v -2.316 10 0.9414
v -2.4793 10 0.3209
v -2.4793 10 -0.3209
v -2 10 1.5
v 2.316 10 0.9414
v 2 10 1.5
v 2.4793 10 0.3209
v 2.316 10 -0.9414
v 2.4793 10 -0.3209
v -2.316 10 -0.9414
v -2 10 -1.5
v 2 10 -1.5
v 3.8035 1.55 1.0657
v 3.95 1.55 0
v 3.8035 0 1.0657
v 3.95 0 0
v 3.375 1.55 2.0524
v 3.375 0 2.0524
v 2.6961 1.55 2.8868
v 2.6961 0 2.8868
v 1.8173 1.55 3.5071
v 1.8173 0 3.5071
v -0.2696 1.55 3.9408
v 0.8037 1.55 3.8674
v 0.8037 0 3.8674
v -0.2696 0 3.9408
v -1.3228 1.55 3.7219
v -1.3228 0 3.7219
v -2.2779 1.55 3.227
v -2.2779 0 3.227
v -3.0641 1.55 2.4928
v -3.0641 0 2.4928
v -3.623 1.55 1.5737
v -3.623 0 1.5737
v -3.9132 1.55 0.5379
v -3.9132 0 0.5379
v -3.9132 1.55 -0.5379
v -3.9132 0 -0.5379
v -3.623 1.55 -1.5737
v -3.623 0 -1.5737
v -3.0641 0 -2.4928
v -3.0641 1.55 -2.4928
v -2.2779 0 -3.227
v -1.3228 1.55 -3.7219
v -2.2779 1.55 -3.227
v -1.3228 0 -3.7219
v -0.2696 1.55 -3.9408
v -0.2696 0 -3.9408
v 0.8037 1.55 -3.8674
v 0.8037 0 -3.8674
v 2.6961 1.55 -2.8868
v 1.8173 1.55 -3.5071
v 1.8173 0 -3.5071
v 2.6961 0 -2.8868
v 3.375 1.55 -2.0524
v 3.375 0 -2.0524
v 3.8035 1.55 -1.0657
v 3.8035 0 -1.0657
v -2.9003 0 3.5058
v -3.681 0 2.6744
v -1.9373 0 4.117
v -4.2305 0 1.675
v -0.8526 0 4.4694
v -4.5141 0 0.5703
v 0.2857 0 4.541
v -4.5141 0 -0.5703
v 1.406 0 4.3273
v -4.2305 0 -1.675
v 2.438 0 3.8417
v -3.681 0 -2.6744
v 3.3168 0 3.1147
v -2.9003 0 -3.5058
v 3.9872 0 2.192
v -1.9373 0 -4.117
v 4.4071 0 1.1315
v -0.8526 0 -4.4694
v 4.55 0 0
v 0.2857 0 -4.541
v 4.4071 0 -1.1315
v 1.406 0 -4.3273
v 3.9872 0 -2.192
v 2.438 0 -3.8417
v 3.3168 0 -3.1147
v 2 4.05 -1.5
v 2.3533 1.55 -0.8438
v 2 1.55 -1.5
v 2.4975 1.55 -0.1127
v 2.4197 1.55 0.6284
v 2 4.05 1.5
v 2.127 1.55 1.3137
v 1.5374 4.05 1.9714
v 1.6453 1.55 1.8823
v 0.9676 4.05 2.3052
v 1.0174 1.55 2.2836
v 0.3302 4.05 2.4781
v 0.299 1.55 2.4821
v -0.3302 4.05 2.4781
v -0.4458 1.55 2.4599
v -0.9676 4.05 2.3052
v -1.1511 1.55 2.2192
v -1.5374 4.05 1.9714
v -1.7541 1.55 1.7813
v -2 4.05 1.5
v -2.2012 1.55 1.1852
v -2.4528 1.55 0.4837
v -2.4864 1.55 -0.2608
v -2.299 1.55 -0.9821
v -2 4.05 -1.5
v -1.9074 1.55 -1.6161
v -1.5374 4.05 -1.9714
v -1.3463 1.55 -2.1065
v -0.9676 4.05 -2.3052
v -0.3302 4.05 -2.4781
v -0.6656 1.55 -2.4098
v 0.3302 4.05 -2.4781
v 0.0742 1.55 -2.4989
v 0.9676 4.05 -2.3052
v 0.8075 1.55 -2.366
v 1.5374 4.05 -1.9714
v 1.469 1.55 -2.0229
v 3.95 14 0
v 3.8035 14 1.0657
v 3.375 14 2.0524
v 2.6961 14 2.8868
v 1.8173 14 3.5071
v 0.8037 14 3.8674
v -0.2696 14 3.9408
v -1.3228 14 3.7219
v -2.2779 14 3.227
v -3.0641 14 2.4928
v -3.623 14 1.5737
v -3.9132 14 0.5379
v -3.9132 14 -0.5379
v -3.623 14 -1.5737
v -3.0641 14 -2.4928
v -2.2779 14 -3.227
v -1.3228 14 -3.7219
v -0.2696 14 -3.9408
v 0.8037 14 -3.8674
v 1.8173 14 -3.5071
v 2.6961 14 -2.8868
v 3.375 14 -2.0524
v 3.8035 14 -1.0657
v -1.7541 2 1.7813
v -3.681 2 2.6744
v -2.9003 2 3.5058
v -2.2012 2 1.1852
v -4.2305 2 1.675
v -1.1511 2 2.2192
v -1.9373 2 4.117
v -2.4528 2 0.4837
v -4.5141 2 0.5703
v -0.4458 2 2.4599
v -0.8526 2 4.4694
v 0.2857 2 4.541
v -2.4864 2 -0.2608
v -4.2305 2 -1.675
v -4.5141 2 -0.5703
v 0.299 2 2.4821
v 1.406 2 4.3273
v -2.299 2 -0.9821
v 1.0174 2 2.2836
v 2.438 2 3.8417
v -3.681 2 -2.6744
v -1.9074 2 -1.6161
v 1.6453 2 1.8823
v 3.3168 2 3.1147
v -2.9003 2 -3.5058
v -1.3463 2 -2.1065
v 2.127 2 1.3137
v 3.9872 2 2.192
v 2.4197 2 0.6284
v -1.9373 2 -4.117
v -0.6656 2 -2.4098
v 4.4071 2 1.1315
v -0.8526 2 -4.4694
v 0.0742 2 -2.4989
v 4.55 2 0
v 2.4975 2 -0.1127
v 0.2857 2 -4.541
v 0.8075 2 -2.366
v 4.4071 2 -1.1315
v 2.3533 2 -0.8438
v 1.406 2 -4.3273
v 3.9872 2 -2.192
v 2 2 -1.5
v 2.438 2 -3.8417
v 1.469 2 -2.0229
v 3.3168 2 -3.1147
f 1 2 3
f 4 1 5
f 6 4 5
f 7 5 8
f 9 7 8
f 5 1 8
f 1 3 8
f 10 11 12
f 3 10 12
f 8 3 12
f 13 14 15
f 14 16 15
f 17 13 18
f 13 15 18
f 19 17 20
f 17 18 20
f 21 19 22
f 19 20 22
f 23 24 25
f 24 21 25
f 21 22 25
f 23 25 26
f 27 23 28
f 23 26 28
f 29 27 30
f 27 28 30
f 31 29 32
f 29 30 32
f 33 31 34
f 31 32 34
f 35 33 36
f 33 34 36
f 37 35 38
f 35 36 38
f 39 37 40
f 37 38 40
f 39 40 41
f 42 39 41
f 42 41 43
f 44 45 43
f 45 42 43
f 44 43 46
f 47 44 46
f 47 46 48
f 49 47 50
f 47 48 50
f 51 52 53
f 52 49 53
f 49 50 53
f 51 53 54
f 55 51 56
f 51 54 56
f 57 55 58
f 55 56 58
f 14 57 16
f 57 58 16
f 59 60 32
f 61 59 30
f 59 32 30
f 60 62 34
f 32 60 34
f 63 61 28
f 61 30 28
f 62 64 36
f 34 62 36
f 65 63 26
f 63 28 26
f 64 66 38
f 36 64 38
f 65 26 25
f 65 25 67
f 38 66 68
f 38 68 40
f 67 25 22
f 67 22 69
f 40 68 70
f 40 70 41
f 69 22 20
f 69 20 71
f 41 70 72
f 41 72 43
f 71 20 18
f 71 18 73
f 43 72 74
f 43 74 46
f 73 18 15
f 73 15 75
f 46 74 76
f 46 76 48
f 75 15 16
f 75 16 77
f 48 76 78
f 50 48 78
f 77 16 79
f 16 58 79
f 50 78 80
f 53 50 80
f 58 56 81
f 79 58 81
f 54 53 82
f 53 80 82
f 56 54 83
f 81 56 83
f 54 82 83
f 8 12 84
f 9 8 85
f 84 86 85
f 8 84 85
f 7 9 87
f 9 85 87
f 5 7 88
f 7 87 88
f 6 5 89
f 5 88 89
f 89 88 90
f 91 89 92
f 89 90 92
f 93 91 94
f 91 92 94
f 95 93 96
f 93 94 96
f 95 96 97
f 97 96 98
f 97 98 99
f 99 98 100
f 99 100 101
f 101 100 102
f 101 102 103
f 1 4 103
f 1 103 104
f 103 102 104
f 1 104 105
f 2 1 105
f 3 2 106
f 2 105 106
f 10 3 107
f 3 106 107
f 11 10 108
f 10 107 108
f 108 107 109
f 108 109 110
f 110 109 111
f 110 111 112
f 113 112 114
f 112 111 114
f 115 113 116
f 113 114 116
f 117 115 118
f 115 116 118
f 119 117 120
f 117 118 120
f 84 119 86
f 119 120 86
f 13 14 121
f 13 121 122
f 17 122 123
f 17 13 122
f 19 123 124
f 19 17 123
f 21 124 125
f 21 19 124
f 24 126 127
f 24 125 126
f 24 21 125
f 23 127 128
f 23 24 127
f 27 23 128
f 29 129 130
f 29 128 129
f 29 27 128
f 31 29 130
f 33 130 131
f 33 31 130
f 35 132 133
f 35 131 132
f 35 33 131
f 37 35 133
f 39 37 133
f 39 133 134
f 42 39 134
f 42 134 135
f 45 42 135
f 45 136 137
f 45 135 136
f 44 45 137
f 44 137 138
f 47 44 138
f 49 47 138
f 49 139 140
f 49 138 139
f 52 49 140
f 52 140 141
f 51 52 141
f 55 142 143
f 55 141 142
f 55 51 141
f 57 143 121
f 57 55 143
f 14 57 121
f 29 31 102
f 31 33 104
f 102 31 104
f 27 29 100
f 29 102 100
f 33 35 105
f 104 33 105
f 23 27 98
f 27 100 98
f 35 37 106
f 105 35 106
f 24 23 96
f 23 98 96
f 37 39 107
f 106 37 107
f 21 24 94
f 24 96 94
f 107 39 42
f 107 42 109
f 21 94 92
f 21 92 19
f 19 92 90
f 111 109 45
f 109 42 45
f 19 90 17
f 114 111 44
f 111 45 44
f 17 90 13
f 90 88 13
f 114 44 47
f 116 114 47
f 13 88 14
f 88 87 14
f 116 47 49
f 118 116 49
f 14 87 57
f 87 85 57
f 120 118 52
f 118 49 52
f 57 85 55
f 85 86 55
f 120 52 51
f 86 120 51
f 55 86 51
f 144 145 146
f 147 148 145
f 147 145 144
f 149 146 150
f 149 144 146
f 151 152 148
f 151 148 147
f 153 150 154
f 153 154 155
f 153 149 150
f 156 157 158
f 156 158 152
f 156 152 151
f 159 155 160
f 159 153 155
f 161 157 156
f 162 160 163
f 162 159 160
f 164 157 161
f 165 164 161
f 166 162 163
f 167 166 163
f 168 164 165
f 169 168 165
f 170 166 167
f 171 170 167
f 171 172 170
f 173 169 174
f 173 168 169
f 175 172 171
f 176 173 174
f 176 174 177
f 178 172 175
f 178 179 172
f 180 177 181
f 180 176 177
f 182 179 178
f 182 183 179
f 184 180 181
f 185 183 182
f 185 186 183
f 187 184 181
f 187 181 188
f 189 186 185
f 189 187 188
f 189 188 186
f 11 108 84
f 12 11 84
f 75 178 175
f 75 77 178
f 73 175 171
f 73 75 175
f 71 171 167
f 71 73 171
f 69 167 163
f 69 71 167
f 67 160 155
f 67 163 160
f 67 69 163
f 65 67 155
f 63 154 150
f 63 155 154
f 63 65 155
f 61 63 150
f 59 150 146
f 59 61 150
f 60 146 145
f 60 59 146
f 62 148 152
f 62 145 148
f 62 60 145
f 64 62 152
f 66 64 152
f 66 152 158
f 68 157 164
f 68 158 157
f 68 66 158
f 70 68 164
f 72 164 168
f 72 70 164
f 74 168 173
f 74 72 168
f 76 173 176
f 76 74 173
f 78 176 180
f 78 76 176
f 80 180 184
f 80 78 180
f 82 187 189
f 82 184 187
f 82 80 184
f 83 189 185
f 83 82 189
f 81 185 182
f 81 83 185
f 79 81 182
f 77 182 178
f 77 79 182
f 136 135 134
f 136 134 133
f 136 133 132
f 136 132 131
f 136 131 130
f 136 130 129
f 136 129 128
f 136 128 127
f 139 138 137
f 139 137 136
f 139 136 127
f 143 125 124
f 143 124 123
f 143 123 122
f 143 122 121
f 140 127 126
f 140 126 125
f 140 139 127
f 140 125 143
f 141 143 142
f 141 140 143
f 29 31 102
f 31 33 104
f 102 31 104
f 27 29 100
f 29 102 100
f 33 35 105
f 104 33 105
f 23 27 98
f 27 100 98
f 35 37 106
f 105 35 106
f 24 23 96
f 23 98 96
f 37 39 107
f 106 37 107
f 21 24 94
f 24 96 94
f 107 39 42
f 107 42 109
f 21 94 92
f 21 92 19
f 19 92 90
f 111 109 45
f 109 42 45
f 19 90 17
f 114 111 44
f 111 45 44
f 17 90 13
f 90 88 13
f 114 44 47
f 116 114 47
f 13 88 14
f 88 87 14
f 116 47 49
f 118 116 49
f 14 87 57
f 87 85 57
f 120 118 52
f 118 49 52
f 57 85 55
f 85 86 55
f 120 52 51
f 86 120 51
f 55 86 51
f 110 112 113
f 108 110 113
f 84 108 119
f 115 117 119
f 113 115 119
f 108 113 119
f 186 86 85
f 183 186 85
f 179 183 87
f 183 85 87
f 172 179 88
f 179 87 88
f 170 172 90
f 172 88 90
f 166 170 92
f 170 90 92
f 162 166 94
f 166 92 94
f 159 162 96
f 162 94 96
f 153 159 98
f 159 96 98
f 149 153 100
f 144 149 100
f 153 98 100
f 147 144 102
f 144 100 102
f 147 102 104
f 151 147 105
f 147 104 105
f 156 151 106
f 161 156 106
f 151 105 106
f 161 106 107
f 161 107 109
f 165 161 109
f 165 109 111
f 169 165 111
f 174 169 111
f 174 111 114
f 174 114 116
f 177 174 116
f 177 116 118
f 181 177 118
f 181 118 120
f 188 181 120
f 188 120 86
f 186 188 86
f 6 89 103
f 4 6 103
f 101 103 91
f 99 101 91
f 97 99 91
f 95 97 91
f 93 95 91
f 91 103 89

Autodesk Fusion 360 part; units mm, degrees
sketch "Sketch1" plane through (0, 0, 0) normal (0, 1, 0) x (1, 0, 0)
  circle A0 centre (0, 0) radius 3.95
  circle A1 centre (0, 0) radius 2.5
  line L0 (0, 1.5) -> (2, 1.5)
  line L1 (0, 1.5) -> (-2, 1.5)
  line L2 (0, -1.5) -> (-2, -1.5)
  line L3 (0, -1.5) -> (2, -1.5)
  circle A2 centre (0, 0) radius 4.55
  dimension "d1" = 7.9
  dimension "d2" = 5
  dimension "d3" = 9.1
extrude "Extrude2" add sketch "Sketch1" along normal blind 14 contours A0 | A1 L0 L1 L2 L3 | A1 L0 L1 | A1 L2 L3 makes body 1
extrude "Extrude1" add sketch "Sketch1" along normal blind 2 separate body contours A0 | A1 L0 L1 L2 L3 | A1 L0 L1 | A1 L2 L3 | A2 makes body 2
extrude "Extrude3" cut sketch "Sketch1" along normal blind 1.55 contours A0 bodies 1 2
extrude "Extrude4" cut sketch "Sketch1" along normal blind 10 contours A1 L0 L1 L2 L3 bodies 1 2
extrude "Extrude5" cut sketch "Sketch1" along normal blind 4.05 contours A1 L0 L1 | A1 L2 L3 bodies 1 2
